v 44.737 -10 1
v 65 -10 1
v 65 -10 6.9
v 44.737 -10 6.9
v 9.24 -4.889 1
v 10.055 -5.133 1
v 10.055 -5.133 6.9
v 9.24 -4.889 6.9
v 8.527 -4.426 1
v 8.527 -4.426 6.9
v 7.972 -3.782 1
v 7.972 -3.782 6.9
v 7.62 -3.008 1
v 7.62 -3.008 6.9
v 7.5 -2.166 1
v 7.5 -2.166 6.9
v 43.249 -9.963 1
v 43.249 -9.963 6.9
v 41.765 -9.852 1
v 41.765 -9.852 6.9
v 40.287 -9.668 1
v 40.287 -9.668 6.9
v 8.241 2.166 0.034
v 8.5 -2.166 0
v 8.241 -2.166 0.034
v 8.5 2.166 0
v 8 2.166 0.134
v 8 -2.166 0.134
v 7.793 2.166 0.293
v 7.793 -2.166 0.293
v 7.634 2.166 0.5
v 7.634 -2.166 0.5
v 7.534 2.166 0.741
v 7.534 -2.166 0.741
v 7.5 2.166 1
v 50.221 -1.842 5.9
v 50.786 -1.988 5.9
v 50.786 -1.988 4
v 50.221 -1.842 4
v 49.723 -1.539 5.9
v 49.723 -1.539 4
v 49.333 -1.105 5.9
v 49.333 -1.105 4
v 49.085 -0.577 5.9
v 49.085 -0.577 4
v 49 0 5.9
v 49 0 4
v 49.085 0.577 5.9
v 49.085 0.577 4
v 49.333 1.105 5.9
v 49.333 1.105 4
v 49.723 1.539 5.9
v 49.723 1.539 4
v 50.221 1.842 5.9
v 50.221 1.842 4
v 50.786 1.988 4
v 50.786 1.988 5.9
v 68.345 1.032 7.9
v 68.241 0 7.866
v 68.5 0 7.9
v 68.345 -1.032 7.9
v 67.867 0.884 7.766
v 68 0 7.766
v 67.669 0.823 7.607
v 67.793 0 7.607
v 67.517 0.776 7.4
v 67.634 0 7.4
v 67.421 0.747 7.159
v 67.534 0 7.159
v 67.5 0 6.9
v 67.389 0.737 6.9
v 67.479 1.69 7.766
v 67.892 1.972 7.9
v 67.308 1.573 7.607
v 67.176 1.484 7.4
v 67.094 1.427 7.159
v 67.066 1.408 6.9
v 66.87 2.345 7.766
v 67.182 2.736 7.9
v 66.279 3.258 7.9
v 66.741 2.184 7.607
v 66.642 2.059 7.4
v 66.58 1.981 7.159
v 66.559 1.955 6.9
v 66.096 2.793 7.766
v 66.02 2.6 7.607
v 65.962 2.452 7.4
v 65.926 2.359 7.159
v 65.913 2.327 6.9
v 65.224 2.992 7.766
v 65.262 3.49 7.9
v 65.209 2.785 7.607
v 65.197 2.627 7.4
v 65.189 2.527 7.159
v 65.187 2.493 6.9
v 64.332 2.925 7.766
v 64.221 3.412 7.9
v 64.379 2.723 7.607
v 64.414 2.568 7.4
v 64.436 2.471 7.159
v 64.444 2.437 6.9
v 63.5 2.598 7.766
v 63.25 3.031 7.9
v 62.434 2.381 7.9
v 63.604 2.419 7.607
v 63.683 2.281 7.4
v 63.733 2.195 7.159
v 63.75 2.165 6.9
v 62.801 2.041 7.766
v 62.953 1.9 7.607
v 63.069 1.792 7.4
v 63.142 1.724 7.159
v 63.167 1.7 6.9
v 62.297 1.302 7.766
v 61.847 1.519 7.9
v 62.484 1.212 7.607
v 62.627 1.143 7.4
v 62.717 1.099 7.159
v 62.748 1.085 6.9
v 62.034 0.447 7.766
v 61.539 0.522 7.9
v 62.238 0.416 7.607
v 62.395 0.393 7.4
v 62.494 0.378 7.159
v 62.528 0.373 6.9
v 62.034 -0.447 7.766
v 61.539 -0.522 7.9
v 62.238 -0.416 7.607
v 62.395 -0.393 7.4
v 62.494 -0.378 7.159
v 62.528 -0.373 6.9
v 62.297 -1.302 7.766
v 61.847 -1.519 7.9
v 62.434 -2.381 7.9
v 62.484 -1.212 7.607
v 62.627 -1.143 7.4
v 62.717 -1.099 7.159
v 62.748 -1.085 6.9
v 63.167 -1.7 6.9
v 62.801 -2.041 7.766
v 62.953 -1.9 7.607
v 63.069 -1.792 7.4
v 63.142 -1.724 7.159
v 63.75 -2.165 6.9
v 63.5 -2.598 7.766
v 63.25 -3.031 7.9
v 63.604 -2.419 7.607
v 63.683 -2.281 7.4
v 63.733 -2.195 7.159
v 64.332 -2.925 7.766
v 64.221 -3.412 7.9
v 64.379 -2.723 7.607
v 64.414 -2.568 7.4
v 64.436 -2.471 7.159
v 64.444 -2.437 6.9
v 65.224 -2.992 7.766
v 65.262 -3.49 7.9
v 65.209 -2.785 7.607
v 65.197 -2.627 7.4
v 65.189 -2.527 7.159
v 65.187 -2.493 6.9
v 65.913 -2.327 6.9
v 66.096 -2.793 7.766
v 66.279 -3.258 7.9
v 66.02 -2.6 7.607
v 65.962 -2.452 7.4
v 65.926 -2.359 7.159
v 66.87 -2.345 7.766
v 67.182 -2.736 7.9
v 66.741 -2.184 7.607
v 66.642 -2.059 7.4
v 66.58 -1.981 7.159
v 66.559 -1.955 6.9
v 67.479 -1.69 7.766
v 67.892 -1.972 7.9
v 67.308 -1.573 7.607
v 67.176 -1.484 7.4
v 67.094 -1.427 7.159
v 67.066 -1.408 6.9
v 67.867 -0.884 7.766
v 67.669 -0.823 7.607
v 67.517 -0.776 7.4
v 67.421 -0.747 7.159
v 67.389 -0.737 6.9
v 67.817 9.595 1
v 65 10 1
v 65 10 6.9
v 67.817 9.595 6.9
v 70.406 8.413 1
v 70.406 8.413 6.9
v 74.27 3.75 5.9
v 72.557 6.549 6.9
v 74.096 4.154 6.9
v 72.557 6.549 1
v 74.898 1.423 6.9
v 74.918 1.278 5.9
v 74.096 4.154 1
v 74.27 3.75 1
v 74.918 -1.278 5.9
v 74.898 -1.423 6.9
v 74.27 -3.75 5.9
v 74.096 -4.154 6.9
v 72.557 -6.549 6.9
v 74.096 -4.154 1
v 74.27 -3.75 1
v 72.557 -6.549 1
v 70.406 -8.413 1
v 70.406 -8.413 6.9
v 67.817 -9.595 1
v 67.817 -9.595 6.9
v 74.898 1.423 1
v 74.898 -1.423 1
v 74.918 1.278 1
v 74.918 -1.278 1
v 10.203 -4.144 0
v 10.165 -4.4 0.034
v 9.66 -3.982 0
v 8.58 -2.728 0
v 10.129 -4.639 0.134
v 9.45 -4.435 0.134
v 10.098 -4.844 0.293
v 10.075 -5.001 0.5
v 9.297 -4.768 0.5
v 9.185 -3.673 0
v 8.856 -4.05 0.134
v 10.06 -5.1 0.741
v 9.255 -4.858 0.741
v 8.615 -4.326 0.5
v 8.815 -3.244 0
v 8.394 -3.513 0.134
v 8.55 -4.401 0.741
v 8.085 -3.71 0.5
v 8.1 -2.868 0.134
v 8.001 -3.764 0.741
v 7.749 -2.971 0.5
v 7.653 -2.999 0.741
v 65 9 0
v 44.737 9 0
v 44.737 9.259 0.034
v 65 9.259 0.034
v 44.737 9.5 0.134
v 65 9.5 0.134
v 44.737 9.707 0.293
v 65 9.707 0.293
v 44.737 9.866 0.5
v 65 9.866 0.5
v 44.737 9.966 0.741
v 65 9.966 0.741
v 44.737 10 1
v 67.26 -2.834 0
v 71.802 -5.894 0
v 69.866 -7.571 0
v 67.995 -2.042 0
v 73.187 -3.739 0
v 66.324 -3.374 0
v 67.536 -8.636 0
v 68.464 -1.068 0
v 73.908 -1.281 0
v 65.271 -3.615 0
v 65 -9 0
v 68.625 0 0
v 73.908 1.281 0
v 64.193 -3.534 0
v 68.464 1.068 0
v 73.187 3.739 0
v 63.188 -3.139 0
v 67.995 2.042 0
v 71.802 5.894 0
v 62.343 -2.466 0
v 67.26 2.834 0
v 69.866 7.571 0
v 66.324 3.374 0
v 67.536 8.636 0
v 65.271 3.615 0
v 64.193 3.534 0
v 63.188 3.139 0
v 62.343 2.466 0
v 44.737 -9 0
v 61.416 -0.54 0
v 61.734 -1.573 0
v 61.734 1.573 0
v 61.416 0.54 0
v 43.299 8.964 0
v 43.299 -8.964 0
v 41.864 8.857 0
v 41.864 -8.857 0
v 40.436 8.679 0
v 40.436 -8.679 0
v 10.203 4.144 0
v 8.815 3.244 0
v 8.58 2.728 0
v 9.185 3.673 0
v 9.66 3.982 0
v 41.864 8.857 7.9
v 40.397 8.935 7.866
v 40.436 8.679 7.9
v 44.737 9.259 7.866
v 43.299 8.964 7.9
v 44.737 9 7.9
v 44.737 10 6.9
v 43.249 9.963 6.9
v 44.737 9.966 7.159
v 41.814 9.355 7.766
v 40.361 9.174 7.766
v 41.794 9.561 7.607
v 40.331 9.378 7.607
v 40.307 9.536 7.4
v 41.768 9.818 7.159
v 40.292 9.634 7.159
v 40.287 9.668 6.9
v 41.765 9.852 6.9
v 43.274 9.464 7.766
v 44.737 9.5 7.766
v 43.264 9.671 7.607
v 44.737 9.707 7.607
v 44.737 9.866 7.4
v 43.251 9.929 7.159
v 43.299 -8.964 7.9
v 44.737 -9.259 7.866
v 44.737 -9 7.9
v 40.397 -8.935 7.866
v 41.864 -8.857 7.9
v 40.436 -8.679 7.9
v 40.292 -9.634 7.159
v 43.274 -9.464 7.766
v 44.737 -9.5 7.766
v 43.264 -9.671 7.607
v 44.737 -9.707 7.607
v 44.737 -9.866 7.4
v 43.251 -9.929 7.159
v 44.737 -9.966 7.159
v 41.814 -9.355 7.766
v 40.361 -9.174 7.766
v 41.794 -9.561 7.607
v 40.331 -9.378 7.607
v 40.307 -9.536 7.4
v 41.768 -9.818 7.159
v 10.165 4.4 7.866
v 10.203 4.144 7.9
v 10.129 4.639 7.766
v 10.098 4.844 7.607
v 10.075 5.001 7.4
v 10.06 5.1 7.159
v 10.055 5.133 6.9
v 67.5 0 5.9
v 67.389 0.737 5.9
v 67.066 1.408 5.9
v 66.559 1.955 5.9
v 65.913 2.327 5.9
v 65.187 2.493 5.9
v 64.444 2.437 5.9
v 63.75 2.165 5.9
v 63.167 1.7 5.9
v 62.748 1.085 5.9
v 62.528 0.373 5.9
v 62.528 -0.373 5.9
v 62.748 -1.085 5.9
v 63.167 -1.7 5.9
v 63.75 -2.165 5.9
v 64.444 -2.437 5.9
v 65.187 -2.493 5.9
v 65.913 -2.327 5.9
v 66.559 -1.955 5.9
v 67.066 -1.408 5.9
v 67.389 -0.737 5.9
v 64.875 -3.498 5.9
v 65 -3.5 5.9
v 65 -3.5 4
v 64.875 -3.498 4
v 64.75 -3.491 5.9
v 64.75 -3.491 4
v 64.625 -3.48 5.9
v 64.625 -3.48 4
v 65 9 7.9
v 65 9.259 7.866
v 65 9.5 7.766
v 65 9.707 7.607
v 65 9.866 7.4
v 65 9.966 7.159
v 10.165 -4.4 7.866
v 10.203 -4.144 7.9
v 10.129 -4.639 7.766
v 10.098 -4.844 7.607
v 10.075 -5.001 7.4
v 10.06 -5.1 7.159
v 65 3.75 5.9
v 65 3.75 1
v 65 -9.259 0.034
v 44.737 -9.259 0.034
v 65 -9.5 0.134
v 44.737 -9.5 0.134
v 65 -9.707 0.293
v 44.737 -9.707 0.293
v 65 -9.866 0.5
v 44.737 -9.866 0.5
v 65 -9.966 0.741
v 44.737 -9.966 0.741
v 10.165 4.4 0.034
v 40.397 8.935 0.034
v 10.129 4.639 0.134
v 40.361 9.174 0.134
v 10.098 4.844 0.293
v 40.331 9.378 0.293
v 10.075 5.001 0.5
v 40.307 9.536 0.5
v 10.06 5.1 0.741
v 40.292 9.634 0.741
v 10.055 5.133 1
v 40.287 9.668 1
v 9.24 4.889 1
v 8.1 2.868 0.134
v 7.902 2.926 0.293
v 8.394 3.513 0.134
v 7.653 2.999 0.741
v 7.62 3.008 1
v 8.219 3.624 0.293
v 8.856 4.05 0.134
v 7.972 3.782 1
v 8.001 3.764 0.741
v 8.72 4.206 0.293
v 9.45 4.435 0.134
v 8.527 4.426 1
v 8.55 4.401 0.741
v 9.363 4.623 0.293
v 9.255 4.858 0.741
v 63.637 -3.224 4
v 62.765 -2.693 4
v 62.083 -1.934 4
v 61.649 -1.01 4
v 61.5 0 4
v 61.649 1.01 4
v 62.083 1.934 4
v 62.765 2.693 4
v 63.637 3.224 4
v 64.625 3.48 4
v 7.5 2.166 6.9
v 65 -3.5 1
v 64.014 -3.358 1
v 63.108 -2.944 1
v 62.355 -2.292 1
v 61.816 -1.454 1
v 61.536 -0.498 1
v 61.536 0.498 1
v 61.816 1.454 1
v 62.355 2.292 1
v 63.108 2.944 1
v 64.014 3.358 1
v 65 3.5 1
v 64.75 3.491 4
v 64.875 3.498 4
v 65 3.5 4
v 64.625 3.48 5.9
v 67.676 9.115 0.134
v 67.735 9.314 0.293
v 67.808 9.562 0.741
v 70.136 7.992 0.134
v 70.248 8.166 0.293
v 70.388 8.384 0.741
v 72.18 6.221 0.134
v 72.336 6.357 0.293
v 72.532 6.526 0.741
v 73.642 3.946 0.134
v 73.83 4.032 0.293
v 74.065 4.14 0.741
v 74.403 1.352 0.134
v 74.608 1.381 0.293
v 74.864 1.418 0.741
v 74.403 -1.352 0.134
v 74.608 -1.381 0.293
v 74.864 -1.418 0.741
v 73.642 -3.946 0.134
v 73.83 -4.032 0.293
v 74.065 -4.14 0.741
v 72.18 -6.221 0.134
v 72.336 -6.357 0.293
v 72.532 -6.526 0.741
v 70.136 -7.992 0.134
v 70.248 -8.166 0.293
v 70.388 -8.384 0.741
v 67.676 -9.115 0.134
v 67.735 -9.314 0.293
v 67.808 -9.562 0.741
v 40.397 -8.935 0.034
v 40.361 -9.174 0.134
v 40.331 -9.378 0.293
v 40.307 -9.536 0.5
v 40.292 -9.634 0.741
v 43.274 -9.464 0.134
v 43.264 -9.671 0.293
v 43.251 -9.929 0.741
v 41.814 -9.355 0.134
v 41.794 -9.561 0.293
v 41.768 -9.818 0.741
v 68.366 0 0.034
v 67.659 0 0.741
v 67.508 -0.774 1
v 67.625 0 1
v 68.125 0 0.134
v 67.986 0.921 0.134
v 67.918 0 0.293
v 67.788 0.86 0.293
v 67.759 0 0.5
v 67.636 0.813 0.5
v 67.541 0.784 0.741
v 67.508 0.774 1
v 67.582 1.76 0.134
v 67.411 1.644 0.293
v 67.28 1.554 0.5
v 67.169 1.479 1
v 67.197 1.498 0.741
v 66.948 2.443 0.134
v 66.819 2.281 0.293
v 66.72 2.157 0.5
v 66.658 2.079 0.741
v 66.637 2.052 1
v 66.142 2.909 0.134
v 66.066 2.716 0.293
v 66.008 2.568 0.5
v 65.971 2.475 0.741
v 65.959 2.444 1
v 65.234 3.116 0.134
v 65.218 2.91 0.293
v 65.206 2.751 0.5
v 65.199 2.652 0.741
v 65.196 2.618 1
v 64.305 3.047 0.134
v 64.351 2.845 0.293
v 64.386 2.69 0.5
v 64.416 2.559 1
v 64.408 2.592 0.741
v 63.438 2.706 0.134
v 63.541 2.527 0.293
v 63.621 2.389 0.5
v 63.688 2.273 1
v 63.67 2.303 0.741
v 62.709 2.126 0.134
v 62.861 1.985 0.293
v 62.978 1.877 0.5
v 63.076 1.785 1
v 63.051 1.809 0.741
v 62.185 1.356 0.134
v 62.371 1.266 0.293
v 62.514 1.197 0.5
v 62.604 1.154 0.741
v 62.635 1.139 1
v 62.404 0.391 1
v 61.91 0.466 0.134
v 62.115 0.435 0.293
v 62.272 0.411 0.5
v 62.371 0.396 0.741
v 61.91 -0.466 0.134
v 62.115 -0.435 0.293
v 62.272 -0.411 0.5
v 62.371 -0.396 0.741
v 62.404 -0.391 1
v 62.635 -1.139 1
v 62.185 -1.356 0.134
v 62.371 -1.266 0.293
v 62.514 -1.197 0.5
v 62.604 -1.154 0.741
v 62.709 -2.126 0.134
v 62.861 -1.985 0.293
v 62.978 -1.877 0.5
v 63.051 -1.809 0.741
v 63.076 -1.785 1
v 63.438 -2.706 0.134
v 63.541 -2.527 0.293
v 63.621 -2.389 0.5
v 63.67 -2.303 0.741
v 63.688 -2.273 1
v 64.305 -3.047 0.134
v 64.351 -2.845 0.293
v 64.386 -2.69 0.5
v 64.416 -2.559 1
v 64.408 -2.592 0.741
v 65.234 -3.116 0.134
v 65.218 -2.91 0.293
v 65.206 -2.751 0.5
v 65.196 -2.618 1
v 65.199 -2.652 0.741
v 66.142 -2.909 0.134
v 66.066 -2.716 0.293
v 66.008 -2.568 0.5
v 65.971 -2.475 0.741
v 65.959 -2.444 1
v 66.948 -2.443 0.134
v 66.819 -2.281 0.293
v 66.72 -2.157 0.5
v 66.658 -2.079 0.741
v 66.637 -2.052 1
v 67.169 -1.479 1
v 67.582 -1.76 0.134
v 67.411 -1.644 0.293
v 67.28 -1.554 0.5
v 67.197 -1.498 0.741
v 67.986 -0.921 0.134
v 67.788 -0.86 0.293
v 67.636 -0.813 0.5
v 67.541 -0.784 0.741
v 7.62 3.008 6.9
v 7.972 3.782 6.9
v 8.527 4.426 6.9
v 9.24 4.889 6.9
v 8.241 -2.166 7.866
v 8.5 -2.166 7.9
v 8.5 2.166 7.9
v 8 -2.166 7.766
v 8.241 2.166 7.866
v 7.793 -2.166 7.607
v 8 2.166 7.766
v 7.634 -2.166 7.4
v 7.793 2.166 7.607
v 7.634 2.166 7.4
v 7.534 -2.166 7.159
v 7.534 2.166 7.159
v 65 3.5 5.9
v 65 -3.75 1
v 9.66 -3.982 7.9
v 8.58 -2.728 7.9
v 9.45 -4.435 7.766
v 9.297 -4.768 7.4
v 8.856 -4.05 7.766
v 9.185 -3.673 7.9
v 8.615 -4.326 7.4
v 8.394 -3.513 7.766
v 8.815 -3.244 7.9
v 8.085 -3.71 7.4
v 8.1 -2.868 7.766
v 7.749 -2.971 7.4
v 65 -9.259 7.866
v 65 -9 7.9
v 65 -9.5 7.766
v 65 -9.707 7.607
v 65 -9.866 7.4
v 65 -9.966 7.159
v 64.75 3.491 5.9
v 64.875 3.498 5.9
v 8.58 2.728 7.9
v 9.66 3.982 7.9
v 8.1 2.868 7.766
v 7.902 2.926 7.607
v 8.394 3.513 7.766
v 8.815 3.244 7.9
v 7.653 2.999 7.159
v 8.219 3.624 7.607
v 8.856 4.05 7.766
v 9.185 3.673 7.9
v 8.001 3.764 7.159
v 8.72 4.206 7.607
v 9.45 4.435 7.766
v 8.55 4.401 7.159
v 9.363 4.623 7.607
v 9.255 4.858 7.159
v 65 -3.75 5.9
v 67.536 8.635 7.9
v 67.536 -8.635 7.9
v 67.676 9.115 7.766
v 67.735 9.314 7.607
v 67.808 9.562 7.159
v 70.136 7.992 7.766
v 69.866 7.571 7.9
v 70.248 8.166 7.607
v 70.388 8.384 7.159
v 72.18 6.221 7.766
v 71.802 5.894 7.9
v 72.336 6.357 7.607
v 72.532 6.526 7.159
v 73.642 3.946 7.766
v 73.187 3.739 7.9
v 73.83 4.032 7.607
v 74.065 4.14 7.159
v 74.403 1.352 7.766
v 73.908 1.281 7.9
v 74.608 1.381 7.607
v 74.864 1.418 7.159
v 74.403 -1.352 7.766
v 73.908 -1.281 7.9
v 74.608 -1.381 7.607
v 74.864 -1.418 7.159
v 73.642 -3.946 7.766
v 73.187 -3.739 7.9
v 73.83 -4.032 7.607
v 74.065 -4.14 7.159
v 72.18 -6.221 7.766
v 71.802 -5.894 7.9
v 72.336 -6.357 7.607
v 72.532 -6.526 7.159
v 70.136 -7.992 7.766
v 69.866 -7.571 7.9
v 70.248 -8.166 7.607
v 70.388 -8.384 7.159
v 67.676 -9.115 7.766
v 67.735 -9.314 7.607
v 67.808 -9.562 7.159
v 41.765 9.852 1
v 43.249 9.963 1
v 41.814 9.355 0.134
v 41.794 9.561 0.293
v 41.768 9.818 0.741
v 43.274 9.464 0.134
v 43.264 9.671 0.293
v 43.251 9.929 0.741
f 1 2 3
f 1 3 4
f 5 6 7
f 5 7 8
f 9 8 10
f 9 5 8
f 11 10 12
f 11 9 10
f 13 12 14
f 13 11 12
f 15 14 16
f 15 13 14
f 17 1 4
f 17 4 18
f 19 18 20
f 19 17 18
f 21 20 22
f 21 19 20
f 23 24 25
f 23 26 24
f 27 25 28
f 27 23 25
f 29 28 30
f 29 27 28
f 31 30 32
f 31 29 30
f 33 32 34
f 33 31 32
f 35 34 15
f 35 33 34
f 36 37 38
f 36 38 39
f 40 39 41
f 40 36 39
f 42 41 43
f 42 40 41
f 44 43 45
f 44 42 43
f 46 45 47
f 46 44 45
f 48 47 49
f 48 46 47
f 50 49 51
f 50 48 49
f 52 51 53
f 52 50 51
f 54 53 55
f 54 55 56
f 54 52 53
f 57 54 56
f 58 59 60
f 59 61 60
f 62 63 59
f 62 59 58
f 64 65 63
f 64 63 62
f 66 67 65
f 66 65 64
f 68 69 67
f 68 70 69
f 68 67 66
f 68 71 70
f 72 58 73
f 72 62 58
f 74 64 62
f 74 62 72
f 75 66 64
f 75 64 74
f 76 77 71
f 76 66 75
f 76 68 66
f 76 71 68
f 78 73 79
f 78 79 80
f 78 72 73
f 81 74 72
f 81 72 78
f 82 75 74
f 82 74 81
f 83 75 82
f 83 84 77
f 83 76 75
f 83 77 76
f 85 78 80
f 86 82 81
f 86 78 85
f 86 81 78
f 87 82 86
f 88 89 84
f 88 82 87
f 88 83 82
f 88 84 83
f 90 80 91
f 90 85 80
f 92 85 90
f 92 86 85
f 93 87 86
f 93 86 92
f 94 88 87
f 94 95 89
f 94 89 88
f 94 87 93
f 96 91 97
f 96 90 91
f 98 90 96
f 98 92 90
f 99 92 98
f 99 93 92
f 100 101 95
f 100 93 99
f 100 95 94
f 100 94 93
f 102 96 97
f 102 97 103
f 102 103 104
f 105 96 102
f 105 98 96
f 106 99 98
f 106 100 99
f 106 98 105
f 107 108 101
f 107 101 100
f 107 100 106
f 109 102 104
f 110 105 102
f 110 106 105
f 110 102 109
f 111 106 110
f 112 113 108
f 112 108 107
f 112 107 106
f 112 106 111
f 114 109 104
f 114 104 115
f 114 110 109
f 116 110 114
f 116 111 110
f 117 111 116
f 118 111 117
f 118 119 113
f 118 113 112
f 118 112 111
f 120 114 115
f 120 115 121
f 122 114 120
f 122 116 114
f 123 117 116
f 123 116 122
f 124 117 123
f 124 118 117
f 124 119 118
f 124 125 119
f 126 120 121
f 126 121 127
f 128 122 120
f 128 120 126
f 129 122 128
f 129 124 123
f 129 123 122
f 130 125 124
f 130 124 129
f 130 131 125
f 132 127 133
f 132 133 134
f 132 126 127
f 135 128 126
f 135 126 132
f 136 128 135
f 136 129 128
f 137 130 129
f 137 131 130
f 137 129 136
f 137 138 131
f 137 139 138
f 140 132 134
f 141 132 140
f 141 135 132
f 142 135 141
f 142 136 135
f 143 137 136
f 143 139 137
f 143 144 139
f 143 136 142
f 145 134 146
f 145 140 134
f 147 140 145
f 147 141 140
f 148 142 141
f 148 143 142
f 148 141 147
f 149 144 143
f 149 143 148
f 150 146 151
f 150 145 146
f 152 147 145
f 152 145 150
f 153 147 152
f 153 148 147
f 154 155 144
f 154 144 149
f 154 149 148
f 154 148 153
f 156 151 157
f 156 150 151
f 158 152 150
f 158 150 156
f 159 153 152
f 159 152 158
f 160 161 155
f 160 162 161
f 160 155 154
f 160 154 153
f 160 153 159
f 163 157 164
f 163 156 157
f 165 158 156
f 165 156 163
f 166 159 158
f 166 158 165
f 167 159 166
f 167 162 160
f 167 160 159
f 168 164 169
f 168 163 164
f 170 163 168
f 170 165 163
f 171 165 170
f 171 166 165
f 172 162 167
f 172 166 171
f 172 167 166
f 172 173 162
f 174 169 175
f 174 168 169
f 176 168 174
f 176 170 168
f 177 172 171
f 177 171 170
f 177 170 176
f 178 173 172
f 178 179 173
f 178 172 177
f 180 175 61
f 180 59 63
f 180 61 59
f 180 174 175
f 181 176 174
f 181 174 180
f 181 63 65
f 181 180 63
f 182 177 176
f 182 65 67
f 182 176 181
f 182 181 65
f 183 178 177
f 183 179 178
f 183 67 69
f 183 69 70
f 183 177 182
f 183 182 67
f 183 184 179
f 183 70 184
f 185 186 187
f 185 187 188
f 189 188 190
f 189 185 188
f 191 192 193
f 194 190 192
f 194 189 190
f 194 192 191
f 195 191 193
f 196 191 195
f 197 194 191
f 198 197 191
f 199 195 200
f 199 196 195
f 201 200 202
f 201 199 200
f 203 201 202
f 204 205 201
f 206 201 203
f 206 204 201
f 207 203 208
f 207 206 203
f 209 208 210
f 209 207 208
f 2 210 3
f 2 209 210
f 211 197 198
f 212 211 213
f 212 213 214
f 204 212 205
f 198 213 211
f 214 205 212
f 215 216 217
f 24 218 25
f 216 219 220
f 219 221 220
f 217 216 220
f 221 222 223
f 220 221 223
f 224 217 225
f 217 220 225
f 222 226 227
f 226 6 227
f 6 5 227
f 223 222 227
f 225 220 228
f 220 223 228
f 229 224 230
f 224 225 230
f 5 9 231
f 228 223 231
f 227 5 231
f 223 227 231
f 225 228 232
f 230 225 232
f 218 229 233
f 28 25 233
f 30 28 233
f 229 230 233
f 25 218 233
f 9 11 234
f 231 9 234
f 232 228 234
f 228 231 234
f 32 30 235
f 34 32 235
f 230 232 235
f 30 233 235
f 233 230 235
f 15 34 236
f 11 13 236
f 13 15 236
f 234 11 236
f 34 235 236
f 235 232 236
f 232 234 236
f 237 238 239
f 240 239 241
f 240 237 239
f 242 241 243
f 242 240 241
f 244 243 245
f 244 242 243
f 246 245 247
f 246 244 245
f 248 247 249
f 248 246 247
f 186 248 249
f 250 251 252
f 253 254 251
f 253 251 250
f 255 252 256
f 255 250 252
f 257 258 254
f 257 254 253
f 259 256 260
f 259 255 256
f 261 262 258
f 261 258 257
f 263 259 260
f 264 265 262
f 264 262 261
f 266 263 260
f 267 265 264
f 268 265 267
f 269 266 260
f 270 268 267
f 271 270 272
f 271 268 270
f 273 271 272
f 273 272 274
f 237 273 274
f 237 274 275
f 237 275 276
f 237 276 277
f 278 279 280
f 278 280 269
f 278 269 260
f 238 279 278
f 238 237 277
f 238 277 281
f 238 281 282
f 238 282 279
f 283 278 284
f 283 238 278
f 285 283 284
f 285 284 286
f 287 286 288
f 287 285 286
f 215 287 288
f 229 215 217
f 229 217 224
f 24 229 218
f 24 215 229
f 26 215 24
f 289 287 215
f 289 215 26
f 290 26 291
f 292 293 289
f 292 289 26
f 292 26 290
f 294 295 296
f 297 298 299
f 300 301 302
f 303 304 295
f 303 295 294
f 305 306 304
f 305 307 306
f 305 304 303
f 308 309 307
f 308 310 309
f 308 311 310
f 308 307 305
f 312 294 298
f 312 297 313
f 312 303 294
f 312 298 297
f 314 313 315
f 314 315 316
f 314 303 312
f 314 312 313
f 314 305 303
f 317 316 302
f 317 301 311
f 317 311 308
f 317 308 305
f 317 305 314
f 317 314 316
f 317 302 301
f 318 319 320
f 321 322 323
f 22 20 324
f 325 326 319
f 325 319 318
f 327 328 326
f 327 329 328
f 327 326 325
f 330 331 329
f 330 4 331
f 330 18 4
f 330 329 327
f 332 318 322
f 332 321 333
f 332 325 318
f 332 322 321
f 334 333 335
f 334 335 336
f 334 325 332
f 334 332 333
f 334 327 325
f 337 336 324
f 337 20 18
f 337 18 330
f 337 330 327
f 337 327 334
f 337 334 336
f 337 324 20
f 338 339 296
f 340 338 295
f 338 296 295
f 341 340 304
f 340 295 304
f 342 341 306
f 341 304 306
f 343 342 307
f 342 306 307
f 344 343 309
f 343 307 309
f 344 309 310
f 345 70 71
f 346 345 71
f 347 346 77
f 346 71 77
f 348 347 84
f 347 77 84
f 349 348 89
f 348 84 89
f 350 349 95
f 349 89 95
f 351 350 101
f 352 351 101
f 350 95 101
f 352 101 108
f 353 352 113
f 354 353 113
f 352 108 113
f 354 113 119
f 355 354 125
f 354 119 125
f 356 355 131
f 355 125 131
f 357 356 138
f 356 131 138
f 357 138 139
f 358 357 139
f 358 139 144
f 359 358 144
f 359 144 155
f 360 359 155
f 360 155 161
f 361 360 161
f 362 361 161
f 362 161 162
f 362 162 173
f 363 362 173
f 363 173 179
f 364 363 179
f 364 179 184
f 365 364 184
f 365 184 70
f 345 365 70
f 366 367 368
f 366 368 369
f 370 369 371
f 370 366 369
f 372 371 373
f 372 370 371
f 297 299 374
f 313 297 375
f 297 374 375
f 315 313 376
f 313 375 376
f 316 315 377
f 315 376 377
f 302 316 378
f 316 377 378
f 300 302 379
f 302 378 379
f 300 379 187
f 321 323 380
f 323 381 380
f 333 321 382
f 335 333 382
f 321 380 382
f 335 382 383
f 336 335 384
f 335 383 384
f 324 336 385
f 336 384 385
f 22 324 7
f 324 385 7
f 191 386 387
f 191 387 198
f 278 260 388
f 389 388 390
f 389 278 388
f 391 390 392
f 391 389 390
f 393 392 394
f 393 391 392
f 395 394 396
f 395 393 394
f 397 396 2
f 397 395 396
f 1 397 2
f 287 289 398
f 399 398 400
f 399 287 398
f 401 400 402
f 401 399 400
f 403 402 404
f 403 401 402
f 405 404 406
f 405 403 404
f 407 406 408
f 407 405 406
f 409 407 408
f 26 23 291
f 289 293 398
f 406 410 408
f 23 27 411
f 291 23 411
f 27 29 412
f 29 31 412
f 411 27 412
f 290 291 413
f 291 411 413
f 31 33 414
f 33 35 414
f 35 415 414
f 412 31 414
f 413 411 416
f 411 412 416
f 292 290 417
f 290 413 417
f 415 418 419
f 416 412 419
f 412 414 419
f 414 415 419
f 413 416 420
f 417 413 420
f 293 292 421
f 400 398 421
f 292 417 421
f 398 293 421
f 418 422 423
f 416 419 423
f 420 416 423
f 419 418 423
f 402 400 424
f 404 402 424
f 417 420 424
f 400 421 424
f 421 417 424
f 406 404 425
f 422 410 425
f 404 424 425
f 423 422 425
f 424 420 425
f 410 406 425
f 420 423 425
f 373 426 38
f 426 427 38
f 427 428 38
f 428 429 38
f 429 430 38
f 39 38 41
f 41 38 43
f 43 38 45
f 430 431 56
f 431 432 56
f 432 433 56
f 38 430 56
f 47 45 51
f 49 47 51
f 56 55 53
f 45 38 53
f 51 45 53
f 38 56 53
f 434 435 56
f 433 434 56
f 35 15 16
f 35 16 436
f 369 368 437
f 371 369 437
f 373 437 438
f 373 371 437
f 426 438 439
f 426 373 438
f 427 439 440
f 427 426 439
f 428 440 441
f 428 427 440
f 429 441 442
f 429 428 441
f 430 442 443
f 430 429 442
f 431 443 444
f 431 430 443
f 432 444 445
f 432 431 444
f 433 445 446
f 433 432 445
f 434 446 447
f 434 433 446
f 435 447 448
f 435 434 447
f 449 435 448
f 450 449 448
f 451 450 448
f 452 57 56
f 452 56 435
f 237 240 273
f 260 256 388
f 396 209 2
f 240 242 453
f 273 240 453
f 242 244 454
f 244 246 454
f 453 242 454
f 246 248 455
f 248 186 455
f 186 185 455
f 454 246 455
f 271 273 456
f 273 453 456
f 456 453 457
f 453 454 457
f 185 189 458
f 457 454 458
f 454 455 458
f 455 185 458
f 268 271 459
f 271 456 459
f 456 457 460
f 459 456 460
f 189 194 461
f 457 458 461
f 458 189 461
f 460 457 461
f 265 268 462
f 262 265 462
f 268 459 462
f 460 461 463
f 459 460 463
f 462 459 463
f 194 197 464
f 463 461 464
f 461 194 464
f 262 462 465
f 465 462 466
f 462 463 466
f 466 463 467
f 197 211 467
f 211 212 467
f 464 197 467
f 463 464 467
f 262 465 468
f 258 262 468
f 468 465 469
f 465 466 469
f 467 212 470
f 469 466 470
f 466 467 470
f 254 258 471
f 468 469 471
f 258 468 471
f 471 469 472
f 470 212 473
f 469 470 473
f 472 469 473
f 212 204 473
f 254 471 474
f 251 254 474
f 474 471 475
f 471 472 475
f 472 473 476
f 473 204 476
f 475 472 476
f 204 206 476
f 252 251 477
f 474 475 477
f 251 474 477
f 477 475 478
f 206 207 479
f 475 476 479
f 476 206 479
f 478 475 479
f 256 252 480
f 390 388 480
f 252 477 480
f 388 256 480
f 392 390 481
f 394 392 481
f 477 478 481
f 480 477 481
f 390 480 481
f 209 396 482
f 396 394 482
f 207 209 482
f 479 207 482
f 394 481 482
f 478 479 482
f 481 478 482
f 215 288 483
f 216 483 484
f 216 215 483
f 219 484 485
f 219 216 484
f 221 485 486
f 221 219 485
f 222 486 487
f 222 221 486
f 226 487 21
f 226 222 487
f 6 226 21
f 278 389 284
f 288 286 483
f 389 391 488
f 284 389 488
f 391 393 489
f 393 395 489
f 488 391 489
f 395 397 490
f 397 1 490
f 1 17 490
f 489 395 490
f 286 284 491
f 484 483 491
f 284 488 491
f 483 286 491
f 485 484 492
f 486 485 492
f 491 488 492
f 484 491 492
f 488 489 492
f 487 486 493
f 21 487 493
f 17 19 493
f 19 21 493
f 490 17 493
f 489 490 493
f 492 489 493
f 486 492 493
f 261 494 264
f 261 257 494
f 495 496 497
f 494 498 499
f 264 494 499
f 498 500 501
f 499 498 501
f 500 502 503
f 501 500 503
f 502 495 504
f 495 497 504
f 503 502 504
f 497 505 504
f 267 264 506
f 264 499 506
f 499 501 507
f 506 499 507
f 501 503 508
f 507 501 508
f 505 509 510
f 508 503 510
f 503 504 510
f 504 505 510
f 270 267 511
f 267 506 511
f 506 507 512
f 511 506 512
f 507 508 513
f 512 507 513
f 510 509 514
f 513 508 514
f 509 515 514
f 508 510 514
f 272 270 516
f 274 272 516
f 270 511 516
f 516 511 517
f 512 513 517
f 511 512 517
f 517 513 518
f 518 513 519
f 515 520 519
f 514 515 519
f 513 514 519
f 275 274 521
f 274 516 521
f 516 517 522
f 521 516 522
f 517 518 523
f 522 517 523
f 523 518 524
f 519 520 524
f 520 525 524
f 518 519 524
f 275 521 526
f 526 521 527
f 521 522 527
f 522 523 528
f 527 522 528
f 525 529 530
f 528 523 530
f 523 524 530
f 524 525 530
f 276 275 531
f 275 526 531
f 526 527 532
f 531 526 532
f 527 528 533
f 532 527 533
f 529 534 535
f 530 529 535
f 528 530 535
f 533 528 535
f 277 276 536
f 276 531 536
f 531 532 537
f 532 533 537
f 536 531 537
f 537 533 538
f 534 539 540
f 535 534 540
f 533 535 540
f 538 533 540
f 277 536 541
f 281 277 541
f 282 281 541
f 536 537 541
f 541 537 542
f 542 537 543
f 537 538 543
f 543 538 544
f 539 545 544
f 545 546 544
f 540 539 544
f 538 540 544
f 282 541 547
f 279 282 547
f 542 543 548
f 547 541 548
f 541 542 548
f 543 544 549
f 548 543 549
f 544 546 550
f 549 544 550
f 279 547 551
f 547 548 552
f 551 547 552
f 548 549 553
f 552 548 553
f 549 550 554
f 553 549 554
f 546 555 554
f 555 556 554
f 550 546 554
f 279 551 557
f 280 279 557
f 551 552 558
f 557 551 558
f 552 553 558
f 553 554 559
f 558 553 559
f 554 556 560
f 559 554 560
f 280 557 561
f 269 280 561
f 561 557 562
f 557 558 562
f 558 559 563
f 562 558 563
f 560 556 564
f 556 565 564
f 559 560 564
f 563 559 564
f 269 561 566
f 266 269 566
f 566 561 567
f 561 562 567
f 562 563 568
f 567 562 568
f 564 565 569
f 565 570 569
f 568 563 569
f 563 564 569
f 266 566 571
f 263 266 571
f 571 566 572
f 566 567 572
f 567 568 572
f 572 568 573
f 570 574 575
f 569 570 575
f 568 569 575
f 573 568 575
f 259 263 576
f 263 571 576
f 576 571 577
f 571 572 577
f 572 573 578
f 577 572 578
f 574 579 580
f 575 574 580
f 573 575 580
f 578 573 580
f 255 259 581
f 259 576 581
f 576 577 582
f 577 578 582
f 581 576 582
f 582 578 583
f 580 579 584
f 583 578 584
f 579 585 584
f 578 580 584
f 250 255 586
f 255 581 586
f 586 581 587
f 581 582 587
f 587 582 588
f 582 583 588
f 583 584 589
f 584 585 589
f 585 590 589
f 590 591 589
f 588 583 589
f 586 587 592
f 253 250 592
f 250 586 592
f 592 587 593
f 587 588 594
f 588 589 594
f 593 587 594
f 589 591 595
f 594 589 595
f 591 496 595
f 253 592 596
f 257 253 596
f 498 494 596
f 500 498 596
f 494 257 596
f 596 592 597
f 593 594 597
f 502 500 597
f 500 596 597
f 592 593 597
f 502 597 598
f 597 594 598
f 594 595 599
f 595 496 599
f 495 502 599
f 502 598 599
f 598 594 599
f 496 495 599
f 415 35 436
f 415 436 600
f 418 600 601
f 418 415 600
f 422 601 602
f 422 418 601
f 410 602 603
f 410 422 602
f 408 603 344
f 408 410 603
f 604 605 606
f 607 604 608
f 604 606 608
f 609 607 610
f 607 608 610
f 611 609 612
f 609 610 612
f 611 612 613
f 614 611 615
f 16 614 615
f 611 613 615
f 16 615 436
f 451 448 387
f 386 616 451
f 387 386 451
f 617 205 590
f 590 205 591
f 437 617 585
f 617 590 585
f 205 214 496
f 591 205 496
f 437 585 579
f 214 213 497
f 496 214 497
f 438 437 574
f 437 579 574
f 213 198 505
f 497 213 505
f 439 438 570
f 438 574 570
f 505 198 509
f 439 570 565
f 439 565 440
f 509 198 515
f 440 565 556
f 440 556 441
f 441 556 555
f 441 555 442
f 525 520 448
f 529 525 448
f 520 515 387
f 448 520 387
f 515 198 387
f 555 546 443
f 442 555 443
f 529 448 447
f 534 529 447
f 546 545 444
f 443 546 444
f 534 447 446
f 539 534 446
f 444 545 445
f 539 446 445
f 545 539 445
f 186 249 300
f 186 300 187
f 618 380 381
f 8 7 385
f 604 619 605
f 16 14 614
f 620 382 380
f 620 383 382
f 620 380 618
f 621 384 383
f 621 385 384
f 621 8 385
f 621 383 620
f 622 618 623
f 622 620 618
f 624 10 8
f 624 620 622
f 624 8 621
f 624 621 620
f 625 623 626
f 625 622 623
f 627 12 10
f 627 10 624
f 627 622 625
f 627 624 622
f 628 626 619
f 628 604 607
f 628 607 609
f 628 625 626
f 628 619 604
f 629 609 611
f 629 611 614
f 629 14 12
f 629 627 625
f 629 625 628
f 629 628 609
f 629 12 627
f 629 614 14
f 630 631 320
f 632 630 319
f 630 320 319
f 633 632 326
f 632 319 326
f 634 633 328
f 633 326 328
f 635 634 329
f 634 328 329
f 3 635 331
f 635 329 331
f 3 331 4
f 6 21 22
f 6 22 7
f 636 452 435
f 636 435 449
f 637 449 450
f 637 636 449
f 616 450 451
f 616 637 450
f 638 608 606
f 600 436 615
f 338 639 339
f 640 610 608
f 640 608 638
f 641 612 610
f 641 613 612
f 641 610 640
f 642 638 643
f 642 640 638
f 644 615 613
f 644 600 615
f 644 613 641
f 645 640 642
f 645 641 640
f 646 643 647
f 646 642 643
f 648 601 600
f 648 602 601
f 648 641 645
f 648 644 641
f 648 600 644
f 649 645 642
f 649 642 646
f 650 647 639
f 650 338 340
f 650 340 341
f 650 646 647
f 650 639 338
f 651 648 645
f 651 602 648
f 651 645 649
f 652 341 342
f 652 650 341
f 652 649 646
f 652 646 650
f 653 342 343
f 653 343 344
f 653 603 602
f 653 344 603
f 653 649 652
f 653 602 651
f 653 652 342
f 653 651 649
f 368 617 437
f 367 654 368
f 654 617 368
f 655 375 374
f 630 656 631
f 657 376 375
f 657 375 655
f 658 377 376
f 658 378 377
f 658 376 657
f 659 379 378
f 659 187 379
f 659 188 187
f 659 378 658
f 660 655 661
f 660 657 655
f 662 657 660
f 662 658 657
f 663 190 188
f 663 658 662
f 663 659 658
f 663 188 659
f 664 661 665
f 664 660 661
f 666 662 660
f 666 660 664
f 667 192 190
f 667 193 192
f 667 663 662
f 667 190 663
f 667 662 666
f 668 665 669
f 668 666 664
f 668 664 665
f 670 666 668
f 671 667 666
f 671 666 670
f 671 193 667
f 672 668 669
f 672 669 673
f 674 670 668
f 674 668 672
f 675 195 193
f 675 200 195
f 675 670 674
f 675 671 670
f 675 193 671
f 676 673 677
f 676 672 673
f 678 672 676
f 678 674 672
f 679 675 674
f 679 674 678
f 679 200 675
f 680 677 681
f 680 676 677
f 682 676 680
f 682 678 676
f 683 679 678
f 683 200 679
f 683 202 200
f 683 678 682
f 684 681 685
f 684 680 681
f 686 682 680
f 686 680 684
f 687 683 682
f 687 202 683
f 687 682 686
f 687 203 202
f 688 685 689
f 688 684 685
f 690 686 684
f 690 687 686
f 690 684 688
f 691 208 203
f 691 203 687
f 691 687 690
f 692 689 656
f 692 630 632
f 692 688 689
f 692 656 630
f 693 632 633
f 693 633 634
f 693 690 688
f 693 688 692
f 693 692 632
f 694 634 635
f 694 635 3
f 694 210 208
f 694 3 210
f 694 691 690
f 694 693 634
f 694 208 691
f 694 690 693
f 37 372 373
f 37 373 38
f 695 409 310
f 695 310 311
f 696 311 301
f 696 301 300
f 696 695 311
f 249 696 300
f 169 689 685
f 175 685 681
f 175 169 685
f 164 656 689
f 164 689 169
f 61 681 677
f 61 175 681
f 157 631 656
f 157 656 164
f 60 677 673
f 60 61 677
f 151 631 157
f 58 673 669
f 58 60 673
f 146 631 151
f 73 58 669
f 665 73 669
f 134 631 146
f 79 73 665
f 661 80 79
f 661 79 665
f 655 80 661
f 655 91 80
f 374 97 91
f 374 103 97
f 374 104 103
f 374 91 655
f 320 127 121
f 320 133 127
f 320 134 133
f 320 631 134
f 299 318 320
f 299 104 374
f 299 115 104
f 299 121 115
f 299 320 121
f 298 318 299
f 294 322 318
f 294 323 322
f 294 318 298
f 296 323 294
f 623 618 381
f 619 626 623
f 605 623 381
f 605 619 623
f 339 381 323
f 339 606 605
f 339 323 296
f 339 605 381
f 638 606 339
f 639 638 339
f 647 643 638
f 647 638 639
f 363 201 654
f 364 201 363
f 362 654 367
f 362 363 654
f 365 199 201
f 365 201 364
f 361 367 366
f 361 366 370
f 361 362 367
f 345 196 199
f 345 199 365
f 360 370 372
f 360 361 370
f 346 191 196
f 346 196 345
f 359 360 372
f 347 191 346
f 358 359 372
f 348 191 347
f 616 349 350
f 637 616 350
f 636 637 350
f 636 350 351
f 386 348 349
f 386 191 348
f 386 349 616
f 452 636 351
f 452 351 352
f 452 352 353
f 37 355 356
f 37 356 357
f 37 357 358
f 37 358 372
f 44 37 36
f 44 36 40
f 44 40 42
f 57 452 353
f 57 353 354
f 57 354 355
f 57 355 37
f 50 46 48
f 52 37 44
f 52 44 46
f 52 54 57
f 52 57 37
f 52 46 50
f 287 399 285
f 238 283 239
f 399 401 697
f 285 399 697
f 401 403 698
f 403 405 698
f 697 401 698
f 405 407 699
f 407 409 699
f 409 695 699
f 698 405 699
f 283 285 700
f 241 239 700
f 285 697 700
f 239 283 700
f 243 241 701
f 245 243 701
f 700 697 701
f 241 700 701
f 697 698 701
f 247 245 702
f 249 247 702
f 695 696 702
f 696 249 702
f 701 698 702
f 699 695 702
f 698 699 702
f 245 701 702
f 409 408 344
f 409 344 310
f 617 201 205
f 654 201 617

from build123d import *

# Parameters (mm, degrees)
BOSS_EXTRU_2_DEPTH      = 10.4
ESQUISSE2_R             = 2.5
ENL_V_MAT_EXTRU_1_DEPTH = 2.5
ENL_V_MAT_EXTRU_2_DEPTH = 1.9
ENL_V_MAT_EXTRU_3_DEPTH = 3
ESQUISSE6_R             = 2.625
ENL_V_MAT_EXTRU_4_DEPTH = 77.245393303
ESQUISSE8_W             = 4.091090074
ESQUISSE8_H             = 23.887427299
ENL_V_MAT_EXTRU_5_DEPTH = 79
ENL_V_MAT_EXTRU_6_REACH = 78.075
ESQUISSE9_R             = 2.5
CONG_2_R                = 1
CONG_3_R                = 1


with BuildPart() as part:
    # Esquisse1 → Boss.-Extru.2 (new body)
    with BuildSketch(Plane.XY):
        with BuildLine():
            Line((44.737484162, 10), (65, 10))
            ThreePointArc((65, 10), (75, 0), (65, -10))
            Line((65, -10), (44.737484162, -10))
            ThreePointArc((44.737484162, -10), (42.506197266, -9.916907574), (40.287270574, -9.668090586))
            Line((40.287270574, -9.668090586), (10.054978641, -5.133246796))
            ThreePointArc((10.054978641, -5.133246796), (8.226779369, -4.12410675), (7.5, -2.166437738))
            Line((7.5, -2.166437738), (7.5, 2.166437738))
            ThreePointArc((7.5, 2.166437738), (8.226779369, 4.12410675), (10.054978641, 5.133246796))
            Line((10.054978641, 5.133246796), (40.287270574, 9.668090586))
            ThreePointArc((40.287270574, 9.668090586), (42.506197266, 9.916907574), (44.737484162, 10))
        make_face()
    extrude(amount=BOSS_EXTRU_2_DEPTH)

    # Esquisse2 → Enlèv. mat.-Extru.1 (cut)
    with BuildSketch(Plane.XY.offset(10.4)):
        with Locations((65, 0)):
            Circle(ESQUISSE2_R)
    extrude(amount=-ENL_V_MAT_EXTRU_1_DEPTH, mode=Mode.SUBTRACT)

    # Esquisse3 → Enlèv. mat.-Extru.2 (cut)
    with BuildSketch(Plane.XY.offset(5.9)):
        with BuildLine():
            Line((87.5, 3.75), (87.5, -3.75))
            Line((87.5, -3.75), (65, -3.75))
            Line((65, -3.75), (65, -3.5))
            ThreePointArc((65, -3.5), (64.812229587, -3.494959552), (64.625, -3.479852727))
            Line((64.625, -3.479852727), (50.785714286, -1.988487272))
            ThreePointArc((50.785714286, -1.988487272), (49, 0), (50.785714286, 1.988487272))
            Line((50.785714286, 1.988487272), (64.625, 3.479852727))
            ThreePointArc((64.625, 3.479852727), (64.812229587, 3.494959552), (65, 3.5))
            Line((65, 3.5), (65, 3.75))
            Line((65, 3.75), (87.5, 3.75))
        make_face()
    extrude(amount=-ENL_V_MAT_EXTRU_2_DEPTH, mode=Mode.SUBTRACT)

    # Esquisse4 → Enlèv. mat.-Extru.3 (cut)
    with BuildSketch(Plane.XY.offset(4)):
        with BuildLine():
            Line((65, 3.5), (65, 3.75))
            Line((65, 3.75), (88.077593775, 3.75))
            Line((88.077593775, 3.75), (88.077593775, -3.75))
            Line((88.077593775, -3.75), (65, -3.75))
            Line((65, -3.75), (65, -3.5))
            ThreePointArc((65, -3.5), (61.5, 0), (65, 3.5))
        make_face()
    extrude(amount=-ENL_V_MAT_EXTRU_3_DEPTH, mode=Mode.SUBTRACT)

    # Esquisse6 → Enlèv. mat.-Extru.4 (cut, through all)
    with BuildSketch(Plane.XY.offset(1)):
        with Locations((65, 0)):
            Circle(ESQUISSE6_R)
    extrude(amount=-ENL_V_MAT_EXTRU_4_DEPTH, mode=Mode.SUBTRACT)

    # Esquisse8 → Enlèv. mat.-Extru.5 (cut)
    with BuildSketch(Plane(origin=(0, 0, 0), x_dir=(0, 0, -1), z_dir=(1, 0, 0))):
        with Locations((-9.945545037, 0.586827687)):
            Rectangle(ESQUISSE8_W, ESQUISSE8_H)
    extrude(amount=ENL_V_MAT_EXTRU_5_DEPTH, mode=Mode.SUBTRACT)

    # Esquisse9 → Enlèv. mat.-Extru.6 (cut, up to next)
    with BuildSketch(Plane.XY.offset(7.9), mode=Mode.PRIVATE) as enl_v_mat_extru_6_sk1:
        with Locations((65, 0)):
            Circle(ESQUISSE9_R)
    enl_v_mat_extru_6_tool1 = extrude(enl_v_mat_extru_6_sk1.sketch, amount=-ENL_V_MAT_EXTRU_6_REACH, mode=Mode.PRIVATE) & part.part
    add(enl_v_mat_extru_6_tool1.solids().sort_by_distance((65, 0, 7.9))[0], mode=Mode.SUBTRACT)

    # Congé2
    cong_2_edges = [part.edges().sort_by_distance(p)[0] for p in [
        (8.226779369, -4.12410675, 7.9),
        (25.171124608, -7.400668691, 7.9),
        (42.506197266, -9.916907574, 7.9),
        (54.868742081, -10, 7.9),
        (75, 0, 7.9),
        (54.868742081, 10, 7.9),
        (42.506197266, 9.916907574, 7.9),
        (25.171124608, 7.400668691, 7.9),
        (8.226779369, 4.12410675, 7.9),
        (7.5, 0, 7.9),
        (62.5, 0, 7.9),
    ]]
    fillet(cong_2_edges, radius=CONG_2_R)

    # Congé3
    cong_3_edges = [part.edges().sort_by_distance(p)[0] for p in [
        (7.5, 0, 0),
        (8.226779369, 4.12410675, 0),
        (25.171124608, 7.400668691, 0),
        (42.506197266, 9.916907574, 0),
        (54.868742081, 10, 0),
        (75, 0, 0),
        (54.868742081, -10, 0),
        (42.506197266, -9.916907574, 0),
        (25.171124608, -7.400668691, 0),
        (8.226779369, -4.12410675, 0),
        (62.375, 0, 0),
    ]]
    fillet(cong_3_edges, radius=CONG_3_R - 0.0001)  # a hair under: the kernel refuses the full size


solid = part.part
